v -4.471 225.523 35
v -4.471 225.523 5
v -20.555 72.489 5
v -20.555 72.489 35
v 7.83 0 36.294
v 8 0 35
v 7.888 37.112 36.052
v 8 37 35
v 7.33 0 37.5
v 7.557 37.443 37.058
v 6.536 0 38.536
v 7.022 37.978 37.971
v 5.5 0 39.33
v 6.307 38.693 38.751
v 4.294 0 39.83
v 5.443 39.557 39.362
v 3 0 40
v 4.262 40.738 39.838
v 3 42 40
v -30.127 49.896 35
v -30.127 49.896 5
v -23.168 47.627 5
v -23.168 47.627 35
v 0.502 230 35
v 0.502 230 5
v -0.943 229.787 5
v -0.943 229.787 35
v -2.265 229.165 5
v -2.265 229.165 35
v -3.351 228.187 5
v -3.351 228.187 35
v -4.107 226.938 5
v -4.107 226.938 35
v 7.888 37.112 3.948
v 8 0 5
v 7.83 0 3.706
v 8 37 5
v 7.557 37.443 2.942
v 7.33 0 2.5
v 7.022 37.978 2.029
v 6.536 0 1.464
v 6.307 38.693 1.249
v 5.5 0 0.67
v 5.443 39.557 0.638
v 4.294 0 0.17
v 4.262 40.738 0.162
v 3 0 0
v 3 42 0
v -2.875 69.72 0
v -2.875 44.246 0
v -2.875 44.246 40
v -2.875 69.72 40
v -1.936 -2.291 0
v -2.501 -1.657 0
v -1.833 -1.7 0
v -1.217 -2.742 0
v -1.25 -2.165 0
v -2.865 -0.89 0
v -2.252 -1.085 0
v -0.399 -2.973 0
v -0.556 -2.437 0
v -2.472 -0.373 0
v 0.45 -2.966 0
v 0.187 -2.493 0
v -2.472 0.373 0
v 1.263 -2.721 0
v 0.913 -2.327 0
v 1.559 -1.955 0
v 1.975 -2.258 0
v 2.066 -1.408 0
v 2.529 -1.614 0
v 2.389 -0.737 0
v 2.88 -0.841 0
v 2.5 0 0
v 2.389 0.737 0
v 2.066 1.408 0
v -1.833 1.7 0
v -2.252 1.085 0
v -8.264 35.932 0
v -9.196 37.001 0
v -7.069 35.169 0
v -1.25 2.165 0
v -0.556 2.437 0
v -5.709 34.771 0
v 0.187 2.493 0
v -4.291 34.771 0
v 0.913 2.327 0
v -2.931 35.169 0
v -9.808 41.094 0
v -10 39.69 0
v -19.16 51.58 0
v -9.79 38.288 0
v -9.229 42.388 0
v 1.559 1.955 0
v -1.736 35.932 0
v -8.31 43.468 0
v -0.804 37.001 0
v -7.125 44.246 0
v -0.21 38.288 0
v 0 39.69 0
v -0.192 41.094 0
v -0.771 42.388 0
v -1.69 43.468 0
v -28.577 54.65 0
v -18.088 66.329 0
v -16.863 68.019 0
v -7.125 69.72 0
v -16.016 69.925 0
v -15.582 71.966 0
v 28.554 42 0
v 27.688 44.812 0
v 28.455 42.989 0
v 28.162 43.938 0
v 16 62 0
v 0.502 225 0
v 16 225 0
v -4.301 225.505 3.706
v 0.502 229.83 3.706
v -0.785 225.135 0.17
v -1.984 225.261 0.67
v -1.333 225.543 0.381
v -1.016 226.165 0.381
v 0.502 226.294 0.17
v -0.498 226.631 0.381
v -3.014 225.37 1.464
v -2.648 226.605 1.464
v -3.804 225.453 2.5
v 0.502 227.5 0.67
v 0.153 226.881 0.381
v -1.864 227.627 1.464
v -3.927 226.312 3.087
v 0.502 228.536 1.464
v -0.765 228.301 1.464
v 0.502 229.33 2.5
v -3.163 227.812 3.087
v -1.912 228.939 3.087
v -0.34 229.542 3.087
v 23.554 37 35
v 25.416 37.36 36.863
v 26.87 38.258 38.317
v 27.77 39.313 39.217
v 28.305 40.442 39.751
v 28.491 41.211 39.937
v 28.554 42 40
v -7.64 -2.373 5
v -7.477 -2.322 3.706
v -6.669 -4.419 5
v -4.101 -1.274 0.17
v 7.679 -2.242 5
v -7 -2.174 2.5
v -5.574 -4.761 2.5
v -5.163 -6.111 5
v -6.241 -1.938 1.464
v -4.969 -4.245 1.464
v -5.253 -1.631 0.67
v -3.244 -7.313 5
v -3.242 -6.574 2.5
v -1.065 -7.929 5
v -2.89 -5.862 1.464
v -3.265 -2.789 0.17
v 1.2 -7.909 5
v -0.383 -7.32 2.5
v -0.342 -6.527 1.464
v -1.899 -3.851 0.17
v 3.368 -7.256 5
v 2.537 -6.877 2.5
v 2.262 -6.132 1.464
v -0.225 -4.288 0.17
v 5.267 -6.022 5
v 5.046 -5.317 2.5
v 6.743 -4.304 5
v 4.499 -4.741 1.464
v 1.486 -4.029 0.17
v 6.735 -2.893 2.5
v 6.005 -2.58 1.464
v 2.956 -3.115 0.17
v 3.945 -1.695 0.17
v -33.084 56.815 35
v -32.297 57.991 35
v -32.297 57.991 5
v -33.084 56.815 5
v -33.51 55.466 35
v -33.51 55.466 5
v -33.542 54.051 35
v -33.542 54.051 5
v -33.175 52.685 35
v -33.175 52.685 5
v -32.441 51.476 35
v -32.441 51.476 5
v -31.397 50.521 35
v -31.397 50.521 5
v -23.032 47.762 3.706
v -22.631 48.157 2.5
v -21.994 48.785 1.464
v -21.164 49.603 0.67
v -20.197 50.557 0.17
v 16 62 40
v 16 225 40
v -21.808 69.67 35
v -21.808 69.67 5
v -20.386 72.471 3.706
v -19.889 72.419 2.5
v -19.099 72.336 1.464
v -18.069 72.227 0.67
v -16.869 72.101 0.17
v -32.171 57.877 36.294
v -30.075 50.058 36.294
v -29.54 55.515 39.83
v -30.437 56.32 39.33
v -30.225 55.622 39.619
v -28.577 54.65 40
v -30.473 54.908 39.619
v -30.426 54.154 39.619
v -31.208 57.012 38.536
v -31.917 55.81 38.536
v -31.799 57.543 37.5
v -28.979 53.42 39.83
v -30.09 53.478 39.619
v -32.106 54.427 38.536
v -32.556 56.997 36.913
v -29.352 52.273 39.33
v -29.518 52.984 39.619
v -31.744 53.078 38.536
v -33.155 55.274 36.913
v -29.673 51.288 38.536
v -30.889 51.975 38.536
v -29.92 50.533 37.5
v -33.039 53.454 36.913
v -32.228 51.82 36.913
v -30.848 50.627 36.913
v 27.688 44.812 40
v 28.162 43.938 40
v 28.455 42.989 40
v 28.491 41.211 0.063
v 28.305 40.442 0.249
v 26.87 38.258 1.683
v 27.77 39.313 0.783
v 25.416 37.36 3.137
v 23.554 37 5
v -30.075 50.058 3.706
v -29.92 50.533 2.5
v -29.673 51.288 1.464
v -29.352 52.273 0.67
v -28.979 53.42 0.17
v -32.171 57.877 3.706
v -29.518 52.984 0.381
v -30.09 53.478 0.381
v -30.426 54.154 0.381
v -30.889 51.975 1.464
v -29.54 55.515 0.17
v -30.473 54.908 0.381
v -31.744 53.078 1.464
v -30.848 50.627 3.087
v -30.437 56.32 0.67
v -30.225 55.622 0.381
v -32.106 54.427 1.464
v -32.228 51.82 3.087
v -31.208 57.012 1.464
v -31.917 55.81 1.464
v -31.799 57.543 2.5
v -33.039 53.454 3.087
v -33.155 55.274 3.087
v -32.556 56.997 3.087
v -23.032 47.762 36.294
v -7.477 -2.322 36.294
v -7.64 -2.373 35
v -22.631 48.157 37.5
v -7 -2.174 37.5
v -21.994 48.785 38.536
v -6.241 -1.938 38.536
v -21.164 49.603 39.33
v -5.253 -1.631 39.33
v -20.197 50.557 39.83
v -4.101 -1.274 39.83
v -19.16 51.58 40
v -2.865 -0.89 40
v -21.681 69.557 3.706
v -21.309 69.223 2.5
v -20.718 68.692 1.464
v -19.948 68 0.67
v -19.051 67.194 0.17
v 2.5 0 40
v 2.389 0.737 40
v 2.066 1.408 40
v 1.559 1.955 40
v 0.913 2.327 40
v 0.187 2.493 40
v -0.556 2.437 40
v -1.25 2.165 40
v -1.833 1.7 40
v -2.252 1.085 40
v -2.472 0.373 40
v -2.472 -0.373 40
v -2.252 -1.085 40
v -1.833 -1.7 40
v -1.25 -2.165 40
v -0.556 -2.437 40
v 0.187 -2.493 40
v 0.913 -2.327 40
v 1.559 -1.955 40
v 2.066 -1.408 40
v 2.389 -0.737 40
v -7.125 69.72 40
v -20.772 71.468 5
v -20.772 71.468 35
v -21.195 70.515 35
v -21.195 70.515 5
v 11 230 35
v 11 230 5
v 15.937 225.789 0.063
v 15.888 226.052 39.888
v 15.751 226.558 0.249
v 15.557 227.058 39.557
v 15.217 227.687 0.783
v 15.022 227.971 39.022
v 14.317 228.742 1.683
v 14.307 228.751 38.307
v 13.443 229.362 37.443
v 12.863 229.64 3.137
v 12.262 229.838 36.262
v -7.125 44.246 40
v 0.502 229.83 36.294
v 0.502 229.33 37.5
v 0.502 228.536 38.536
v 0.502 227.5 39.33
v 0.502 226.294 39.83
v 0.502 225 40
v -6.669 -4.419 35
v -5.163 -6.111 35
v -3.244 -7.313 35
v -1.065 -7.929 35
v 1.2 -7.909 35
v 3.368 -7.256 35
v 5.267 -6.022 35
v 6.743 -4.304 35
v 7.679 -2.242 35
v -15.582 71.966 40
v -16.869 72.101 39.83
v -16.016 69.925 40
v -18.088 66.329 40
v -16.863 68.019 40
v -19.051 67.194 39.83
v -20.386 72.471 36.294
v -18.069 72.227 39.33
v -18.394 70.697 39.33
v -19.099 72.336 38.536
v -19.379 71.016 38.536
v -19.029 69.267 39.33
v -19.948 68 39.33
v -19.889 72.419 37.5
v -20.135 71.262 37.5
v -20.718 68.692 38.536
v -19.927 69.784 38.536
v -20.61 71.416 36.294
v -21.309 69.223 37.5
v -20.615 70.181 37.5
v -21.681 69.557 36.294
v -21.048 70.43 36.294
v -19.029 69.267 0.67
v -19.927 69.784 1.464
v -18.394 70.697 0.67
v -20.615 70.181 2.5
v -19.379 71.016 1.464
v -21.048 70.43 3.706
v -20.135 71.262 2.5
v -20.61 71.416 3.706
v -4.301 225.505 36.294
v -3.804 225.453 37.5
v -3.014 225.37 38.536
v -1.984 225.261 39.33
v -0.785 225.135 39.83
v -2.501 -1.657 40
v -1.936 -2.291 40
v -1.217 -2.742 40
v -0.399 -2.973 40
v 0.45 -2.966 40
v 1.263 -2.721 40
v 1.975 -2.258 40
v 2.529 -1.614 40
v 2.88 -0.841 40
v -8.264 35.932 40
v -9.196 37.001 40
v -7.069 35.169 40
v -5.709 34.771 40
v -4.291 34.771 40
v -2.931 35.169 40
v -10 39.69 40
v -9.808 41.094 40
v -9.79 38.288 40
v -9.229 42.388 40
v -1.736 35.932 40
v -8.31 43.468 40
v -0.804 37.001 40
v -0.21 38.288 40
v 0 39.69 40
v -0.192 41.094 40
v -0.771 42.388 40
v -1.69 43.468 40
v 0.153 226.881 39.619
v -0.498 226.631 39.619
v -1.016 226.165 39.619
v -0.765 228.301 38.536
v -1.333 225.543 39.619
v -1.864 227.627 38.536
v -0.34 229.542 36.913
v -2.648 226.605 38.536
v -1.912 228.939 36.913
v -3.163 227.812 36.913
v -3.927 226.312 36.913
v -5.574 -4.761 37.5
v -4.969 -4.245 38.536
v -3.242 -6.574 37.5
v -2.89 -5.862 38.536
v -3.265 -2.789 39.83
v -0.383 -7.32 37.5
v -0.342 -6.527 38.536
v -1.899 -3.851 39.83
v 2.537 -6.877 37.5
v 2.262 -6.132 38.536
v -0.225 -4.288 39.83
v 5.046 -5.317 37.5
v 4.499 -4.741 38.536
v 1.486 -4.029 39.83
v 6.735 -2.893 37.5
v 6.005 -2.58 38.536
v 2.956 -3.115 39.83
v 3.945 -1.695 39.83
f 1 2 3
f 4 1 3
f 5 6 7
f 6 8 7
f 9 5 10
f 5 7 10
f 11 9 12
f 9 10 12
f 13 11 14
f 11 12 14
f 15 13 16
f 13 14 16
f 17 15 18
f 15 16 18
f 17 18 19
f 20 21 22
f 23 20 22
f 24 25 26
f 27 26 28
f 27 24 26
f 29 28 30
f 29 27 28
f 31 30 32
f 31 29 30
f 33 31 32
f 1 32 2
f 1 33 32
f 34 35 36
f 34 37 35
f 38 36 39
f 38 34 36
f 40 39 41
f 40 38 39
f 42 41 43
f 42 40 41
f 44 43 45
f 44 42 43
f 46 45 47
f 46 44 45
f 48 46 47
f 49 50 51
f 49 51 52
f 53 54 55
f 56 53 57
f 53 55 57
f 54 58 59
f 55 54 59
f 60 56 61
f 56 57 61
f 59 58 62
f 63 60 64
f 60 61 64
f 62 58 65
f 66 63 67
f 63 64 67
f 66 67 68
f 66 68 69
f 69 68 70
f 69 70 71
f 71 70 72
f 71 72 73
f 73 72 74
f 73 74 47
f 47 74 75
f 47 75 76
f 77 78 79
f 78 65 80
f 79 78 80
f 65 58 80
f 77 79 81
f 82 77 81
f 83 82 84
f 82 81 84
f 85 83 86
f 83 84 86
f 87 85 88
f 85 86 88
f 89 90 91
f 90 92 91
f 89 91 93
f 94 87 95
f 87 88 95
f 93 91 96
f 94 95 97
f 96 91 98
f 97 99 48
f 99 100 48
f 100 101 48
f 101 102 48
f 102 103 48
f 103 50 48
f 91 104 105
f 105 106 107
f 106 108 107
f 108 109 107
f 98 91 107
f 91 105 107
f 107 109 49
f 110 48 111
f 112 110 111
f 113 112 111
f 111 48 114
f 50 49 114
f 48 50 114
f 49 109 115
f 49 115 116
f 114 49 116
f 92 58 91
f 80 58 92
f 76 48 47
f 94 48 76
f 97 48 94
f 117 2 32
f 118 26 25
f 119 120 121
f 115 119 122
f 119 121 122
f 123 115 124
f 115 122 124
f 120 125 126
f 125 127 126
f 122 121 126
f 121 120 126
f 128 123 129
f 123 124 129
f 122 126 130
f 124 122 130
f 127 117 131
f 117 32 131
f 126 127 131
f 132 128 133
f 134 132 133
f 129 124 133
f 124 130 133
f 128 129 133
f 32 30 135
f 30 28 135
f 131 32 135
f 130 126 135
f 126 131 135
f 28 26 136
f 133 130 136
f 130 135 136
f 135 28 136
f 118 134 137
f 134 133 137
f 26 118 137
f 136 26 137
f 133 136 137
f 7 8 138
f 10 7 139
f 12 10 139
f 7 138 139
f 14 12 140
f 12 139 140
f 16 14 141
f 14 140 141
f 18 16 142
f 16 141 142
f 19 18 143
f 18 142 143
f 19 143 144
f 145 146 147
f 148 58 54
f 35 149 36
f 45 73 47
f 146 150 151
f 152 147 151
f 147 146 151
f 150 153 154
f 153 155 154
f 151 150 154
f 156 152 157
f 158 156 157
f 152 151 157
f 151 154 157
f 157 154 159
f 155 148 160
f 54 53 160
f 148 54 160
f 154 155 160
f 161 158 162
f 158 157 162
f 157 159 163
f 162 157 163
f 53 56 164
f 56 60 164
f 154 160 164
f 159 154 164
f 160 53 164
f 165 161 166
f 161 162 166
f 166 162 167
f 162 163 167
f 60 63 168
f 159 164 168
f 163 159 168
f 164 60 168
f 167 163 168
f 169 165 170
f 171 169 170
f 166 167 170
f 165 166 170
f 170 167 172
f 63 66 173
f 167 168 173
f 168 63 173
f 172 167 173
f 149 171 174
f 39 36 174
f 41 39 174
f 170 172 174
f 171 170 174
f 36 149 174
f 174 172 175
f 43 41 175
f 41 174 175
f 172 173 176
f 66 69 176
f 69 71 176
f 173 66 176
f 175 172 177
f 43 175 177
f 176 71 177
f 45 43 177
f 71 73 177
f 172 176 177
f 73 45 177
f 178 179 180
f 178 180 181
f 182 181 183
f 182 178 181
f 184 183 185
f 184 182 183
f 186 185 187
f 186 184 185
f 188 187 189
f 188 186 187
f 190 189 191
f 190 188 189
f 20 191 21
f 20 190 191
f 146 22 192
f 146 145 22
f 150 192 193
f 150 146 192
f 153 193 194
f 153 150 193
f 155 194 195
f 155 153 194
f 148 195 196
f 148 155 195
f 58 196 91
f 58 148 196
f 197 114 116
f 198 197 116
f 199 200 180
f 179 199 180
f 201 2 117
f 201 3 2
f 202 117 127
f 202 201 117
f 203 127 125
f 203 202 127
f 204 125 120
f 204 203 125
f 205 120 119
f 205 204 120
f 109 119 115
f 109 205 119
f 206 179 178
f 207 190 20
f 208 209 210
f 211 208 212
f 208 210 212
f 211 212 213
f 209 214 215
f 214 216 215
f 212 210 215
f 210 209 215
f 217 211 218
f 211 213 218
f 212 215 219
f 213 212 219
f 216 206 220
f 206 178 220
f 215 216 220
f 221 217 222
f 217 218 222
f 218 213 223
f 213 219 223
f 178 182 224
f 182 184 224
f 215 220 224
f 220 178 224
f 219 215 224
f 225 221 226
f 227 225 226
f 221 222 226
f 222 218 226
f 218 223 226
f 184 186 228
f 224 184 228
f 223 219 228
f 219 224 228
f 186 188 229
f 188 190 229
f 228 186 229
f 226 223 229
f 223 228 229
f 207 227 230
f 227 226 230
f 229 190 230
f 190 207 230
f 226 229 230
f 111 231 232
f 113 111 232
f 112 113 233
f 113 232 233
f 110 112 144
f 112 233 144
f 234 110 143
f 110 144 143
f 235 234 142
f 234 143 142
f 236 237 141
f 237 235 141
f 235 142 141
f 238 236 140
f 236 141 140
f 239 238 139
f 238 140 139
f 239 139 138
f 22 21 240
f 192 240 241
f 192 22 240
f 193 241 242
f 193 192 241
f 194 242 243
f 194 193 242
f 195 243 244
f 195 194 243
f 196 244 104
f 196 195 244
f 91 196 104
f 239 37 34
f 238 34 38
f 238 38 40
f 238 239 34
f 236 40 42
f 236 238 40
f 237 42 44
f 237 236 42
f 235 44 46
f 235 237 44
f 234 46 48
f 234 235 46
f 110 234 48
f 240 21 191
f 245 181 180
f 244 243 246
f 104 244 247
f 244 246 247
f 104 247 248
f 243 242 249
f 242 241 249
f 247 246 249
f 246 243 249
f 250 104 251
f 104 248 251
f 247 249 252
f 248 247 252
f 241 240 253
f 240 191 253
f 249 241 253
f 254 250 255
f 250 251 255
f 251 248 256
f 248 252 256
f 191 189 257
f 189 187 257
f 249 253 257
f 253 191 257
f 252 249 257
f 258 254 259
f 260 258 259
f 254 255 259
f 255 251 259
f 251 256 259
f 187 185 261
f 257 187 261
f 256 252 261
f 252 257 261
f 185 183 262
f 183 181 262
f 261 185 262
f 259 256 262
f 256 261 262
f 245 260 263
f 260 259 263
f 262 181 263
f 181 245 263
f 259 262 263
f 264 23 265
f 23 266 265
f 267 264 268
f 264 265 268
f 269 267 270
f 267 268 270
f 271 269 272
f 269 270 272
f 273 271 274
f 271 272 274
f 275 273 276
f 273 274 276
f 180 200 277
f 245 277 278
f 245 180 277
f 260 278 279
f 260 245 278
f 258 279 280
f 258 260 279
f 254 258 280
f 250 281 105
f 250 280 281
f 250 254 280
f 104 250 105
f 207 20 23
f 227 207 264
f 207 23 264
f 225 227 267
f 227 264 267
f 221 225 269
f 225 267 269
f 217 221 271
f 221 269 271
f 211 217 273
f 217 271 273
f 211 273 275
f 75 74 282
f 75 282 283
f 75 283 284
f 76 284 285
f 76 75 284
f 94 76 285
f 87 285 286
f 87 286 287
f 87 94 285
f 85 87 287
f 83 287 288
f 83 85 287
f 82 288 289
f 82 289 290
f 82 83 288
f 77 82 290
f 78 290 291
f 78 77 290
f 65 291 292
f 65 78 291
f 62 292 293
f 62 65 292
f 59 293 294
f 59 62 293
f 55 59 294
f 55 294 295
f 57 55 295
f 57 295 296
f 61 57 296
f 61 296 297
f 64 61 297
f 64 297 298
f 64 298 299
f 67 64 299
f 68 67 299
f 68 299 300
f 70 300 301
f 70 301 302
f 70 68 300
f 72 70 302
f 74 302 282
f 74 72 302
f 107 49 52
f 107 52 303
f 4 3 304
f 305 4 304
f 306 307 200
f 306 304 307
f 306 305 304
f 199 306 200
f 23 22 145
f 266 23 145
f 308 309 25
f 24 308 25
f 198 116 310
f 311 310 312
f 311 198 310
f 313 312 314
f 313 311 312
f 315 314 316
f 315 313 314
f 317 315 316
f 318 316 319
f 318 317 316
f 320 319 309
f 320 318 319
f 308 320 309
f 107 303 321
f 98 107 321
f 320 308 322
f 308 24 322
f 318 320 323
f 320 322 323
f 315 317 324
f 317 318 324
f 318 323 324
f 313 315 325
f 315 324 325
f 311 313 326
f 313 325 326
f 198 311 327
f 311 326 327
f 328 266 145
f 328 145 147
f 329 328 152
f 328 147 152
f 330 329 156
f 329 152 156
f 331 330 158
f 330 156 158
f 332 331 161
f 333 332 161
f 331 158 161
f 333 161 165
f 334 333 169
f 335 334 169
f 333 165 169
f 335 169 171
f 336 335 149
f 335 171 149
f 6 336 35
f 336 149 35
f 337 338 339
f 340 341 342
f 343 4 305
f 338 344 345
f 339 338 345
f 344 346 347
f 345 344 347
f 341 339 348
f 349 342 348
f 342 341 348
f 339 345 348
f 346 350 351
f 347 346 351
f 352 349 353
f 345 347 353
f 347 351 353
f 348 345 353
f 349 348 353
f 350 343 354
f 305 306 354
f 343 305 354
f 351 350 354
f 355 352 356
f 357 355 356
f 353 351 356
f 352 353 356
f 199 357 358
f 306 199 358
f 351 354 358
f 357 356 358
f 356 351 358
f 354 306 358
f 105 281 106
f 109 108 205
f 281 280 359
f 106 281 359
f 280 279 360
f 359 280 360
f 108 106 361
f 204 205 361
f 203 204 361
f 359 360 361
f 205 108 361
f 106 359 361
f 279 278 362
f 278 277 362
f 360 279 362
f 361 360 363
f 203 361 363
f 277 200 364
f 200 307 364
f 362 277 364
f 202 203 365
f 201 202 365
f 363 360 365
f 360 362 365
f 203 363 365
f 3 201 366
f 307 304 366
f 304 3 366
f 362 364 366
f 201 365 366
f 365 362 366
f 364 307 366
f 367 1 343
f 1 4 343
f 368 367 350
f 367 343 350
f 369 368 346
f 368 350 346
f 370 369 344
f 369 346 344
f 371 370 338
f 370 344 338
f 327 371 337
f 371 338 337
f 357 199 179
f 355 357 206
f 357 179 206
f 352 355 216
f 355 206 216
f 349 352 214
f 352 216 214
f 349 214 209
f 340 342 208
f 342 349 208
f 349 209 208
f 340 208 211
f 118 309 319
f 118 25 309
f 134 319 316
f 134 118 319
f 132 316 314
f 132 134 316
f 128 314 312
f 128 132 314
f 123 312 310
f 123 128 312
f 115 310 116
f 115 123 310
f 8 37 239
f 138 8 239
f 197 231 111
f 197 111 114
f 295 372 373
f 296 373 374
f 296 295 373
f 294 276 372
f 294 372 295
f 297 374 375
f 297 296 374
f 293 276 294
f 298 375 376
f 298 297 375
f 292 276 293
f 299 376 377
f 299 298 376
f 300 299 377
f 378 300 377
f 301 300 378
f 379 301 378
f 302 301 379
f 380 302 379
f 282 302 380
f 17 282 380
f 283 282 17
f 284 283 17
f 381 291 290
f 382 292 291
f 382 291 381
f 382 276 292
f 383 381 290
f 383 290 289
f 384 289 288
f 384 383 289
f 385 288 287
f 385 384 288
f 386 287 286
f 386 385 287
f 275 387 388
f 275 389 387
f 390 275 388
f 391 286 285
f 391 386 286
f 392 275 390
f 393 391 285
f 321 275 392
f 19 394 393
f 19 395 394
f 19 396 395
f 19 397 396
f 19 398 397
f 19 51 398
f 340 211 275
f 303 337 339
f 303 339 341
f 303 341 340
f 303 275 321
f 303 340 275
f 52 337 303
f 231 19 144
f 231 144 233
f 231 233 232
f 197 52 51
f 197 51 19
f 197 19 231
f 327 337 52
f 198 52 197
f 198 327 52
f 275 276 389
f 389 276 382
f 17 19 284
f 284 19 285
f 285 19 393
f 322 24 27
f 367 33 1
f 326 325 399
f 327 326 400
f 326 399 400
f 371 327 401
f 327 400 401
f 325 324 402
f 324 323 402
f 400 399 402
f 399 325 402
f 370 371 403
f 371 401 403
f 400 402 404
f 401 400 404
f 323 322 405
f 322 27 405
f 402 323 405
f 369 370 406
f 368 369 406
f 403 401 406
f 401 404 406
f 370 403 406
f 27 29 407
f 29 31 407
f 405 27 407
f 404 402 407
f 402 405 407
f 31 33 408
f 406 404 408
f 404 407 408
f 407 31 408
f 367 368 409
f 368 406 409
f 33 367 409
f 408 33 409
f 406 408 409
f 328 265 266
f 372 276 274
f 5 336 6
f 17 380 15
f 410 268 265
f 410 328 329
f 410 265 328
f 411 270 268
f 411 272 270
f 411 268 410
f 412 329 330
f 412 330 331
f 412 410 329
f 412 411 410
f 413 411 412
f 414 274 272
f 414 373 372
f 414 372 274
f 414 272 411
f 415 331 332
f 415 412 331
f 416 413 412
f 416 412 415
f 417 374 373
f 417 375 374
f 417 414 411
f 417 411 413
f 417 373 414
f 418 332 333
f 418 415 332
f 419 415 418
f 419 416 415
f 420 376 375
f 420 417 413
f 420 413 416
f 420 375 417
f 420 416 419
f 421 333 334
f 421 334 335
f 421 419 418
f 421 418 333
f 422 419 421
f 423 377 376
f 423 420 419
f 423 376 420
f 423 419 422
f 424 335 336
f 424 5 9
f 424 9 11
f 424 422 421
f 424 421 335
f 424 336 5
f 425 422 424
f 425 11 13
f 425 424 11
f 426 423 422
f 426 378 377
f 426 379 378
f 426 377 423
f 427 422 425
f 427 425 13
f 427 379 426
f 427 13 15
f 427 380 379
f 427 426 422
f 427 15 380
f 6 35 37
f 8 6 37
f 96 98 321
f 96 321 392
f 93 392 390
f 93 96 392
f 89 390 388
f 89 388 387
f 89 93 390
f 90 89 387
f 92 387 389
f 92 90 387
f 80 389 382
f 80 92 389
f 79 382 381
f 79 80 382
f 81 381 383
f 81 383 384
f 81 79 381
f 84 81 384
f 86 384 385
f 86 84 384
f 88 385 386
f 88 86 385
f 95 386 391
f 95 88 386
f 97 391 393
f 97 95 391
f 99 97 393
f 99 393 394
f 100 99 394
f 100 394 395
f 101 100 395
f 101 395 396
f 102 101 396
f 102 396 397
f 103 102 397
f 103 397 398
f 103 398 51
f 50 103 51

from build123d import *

# Parameters (mm, degrees)
SKETCH1_R           = 2.5
BOSS_EXTRUDE1_DEPTH = 40
FILLET1_R           = 5


with BuildPart() as part:
    # Sketch1 → Boss-Extrude1 (new body)
    with BuildSketch(Plane.XY):
        with BuildLine():
            Line((16, 62), (16, 230))
            Line((16, 230), (-4, 230))
            Line((-4, 230), (-20.724554123, 70.876496741))
            Line((-20.724554123, 70.876496741), (-37.429359571, 52.276779675))
            Line((-37.429359571, 52.276779675), (-23.168143925, 47.627292789))
            Line((-23.168143925, 47.627292789), (-7.640043226, -2.372707211))
            ThreePointArc((-7.640043226, -2.372707211), (1.199927955, -7.909498903), (8, 0))
            Line((8, 0), (8, 37))
            Line((8, 37), (33, 37))
            Line((33, 37), (16, 62))
        make_face()
        Circle(SKETCH1_R, mode=Mode.SUBTRACT)
        with BuildLine():
            Line((-2.875, 69.720325745), (-7.125, 69.720325745))
            Line((-7.125, 69.720325745), (-7.125, 44.246292492))
            ThreePointArc((-7.125, 44.246292492), (-5, 34.720325745), (-2.875, 44.246292492))
            Line((-2.875, 44.246292492), (-2.875, 69.720325745))
        make_face(mode=Mode.SUBTRACT)
    extrude(amount=BOSS_EXTRUDE1_DEPTH)

    # Fillet1
    fillet1_edges = [part.edges().sort_by_distance(p)[0] for p in [
        (20.5, 37, 40),
        (-29.076956847, 61.576638208, 0),
        (-12.362277061, 150.438248371, 0),
        (6, 230, 0),
        (20.5, 37, 0),
        (8, 18.5, 0),
        (1.199927955, -7.909498903, 0),
        (-37.429359571, 52.276779675, 20),
        (-20.724554123, 70.876496741, 20),
        (-4, 230, 20),
        (16, 230, 20),
        (33, 37, 20),
        (6, 230, 40),
        (-12.362277061, 150.438248371, 40),
        (-29.076956847, 61.576638208, 40),
        (-30.298751748, 49.952036232, 40),
        (-15.404093575, 22.627292789, 40),
        (1.199927955, -7.909498903, 40),
        (8, 18.5, 40),
        (-15.404093575, 22.627292789, 0),
        (-30.298751748, 49.952036232, 0),
    ]]
    fillet(fillet1_edges, radius=FILLET1_R)


solid = part.part
